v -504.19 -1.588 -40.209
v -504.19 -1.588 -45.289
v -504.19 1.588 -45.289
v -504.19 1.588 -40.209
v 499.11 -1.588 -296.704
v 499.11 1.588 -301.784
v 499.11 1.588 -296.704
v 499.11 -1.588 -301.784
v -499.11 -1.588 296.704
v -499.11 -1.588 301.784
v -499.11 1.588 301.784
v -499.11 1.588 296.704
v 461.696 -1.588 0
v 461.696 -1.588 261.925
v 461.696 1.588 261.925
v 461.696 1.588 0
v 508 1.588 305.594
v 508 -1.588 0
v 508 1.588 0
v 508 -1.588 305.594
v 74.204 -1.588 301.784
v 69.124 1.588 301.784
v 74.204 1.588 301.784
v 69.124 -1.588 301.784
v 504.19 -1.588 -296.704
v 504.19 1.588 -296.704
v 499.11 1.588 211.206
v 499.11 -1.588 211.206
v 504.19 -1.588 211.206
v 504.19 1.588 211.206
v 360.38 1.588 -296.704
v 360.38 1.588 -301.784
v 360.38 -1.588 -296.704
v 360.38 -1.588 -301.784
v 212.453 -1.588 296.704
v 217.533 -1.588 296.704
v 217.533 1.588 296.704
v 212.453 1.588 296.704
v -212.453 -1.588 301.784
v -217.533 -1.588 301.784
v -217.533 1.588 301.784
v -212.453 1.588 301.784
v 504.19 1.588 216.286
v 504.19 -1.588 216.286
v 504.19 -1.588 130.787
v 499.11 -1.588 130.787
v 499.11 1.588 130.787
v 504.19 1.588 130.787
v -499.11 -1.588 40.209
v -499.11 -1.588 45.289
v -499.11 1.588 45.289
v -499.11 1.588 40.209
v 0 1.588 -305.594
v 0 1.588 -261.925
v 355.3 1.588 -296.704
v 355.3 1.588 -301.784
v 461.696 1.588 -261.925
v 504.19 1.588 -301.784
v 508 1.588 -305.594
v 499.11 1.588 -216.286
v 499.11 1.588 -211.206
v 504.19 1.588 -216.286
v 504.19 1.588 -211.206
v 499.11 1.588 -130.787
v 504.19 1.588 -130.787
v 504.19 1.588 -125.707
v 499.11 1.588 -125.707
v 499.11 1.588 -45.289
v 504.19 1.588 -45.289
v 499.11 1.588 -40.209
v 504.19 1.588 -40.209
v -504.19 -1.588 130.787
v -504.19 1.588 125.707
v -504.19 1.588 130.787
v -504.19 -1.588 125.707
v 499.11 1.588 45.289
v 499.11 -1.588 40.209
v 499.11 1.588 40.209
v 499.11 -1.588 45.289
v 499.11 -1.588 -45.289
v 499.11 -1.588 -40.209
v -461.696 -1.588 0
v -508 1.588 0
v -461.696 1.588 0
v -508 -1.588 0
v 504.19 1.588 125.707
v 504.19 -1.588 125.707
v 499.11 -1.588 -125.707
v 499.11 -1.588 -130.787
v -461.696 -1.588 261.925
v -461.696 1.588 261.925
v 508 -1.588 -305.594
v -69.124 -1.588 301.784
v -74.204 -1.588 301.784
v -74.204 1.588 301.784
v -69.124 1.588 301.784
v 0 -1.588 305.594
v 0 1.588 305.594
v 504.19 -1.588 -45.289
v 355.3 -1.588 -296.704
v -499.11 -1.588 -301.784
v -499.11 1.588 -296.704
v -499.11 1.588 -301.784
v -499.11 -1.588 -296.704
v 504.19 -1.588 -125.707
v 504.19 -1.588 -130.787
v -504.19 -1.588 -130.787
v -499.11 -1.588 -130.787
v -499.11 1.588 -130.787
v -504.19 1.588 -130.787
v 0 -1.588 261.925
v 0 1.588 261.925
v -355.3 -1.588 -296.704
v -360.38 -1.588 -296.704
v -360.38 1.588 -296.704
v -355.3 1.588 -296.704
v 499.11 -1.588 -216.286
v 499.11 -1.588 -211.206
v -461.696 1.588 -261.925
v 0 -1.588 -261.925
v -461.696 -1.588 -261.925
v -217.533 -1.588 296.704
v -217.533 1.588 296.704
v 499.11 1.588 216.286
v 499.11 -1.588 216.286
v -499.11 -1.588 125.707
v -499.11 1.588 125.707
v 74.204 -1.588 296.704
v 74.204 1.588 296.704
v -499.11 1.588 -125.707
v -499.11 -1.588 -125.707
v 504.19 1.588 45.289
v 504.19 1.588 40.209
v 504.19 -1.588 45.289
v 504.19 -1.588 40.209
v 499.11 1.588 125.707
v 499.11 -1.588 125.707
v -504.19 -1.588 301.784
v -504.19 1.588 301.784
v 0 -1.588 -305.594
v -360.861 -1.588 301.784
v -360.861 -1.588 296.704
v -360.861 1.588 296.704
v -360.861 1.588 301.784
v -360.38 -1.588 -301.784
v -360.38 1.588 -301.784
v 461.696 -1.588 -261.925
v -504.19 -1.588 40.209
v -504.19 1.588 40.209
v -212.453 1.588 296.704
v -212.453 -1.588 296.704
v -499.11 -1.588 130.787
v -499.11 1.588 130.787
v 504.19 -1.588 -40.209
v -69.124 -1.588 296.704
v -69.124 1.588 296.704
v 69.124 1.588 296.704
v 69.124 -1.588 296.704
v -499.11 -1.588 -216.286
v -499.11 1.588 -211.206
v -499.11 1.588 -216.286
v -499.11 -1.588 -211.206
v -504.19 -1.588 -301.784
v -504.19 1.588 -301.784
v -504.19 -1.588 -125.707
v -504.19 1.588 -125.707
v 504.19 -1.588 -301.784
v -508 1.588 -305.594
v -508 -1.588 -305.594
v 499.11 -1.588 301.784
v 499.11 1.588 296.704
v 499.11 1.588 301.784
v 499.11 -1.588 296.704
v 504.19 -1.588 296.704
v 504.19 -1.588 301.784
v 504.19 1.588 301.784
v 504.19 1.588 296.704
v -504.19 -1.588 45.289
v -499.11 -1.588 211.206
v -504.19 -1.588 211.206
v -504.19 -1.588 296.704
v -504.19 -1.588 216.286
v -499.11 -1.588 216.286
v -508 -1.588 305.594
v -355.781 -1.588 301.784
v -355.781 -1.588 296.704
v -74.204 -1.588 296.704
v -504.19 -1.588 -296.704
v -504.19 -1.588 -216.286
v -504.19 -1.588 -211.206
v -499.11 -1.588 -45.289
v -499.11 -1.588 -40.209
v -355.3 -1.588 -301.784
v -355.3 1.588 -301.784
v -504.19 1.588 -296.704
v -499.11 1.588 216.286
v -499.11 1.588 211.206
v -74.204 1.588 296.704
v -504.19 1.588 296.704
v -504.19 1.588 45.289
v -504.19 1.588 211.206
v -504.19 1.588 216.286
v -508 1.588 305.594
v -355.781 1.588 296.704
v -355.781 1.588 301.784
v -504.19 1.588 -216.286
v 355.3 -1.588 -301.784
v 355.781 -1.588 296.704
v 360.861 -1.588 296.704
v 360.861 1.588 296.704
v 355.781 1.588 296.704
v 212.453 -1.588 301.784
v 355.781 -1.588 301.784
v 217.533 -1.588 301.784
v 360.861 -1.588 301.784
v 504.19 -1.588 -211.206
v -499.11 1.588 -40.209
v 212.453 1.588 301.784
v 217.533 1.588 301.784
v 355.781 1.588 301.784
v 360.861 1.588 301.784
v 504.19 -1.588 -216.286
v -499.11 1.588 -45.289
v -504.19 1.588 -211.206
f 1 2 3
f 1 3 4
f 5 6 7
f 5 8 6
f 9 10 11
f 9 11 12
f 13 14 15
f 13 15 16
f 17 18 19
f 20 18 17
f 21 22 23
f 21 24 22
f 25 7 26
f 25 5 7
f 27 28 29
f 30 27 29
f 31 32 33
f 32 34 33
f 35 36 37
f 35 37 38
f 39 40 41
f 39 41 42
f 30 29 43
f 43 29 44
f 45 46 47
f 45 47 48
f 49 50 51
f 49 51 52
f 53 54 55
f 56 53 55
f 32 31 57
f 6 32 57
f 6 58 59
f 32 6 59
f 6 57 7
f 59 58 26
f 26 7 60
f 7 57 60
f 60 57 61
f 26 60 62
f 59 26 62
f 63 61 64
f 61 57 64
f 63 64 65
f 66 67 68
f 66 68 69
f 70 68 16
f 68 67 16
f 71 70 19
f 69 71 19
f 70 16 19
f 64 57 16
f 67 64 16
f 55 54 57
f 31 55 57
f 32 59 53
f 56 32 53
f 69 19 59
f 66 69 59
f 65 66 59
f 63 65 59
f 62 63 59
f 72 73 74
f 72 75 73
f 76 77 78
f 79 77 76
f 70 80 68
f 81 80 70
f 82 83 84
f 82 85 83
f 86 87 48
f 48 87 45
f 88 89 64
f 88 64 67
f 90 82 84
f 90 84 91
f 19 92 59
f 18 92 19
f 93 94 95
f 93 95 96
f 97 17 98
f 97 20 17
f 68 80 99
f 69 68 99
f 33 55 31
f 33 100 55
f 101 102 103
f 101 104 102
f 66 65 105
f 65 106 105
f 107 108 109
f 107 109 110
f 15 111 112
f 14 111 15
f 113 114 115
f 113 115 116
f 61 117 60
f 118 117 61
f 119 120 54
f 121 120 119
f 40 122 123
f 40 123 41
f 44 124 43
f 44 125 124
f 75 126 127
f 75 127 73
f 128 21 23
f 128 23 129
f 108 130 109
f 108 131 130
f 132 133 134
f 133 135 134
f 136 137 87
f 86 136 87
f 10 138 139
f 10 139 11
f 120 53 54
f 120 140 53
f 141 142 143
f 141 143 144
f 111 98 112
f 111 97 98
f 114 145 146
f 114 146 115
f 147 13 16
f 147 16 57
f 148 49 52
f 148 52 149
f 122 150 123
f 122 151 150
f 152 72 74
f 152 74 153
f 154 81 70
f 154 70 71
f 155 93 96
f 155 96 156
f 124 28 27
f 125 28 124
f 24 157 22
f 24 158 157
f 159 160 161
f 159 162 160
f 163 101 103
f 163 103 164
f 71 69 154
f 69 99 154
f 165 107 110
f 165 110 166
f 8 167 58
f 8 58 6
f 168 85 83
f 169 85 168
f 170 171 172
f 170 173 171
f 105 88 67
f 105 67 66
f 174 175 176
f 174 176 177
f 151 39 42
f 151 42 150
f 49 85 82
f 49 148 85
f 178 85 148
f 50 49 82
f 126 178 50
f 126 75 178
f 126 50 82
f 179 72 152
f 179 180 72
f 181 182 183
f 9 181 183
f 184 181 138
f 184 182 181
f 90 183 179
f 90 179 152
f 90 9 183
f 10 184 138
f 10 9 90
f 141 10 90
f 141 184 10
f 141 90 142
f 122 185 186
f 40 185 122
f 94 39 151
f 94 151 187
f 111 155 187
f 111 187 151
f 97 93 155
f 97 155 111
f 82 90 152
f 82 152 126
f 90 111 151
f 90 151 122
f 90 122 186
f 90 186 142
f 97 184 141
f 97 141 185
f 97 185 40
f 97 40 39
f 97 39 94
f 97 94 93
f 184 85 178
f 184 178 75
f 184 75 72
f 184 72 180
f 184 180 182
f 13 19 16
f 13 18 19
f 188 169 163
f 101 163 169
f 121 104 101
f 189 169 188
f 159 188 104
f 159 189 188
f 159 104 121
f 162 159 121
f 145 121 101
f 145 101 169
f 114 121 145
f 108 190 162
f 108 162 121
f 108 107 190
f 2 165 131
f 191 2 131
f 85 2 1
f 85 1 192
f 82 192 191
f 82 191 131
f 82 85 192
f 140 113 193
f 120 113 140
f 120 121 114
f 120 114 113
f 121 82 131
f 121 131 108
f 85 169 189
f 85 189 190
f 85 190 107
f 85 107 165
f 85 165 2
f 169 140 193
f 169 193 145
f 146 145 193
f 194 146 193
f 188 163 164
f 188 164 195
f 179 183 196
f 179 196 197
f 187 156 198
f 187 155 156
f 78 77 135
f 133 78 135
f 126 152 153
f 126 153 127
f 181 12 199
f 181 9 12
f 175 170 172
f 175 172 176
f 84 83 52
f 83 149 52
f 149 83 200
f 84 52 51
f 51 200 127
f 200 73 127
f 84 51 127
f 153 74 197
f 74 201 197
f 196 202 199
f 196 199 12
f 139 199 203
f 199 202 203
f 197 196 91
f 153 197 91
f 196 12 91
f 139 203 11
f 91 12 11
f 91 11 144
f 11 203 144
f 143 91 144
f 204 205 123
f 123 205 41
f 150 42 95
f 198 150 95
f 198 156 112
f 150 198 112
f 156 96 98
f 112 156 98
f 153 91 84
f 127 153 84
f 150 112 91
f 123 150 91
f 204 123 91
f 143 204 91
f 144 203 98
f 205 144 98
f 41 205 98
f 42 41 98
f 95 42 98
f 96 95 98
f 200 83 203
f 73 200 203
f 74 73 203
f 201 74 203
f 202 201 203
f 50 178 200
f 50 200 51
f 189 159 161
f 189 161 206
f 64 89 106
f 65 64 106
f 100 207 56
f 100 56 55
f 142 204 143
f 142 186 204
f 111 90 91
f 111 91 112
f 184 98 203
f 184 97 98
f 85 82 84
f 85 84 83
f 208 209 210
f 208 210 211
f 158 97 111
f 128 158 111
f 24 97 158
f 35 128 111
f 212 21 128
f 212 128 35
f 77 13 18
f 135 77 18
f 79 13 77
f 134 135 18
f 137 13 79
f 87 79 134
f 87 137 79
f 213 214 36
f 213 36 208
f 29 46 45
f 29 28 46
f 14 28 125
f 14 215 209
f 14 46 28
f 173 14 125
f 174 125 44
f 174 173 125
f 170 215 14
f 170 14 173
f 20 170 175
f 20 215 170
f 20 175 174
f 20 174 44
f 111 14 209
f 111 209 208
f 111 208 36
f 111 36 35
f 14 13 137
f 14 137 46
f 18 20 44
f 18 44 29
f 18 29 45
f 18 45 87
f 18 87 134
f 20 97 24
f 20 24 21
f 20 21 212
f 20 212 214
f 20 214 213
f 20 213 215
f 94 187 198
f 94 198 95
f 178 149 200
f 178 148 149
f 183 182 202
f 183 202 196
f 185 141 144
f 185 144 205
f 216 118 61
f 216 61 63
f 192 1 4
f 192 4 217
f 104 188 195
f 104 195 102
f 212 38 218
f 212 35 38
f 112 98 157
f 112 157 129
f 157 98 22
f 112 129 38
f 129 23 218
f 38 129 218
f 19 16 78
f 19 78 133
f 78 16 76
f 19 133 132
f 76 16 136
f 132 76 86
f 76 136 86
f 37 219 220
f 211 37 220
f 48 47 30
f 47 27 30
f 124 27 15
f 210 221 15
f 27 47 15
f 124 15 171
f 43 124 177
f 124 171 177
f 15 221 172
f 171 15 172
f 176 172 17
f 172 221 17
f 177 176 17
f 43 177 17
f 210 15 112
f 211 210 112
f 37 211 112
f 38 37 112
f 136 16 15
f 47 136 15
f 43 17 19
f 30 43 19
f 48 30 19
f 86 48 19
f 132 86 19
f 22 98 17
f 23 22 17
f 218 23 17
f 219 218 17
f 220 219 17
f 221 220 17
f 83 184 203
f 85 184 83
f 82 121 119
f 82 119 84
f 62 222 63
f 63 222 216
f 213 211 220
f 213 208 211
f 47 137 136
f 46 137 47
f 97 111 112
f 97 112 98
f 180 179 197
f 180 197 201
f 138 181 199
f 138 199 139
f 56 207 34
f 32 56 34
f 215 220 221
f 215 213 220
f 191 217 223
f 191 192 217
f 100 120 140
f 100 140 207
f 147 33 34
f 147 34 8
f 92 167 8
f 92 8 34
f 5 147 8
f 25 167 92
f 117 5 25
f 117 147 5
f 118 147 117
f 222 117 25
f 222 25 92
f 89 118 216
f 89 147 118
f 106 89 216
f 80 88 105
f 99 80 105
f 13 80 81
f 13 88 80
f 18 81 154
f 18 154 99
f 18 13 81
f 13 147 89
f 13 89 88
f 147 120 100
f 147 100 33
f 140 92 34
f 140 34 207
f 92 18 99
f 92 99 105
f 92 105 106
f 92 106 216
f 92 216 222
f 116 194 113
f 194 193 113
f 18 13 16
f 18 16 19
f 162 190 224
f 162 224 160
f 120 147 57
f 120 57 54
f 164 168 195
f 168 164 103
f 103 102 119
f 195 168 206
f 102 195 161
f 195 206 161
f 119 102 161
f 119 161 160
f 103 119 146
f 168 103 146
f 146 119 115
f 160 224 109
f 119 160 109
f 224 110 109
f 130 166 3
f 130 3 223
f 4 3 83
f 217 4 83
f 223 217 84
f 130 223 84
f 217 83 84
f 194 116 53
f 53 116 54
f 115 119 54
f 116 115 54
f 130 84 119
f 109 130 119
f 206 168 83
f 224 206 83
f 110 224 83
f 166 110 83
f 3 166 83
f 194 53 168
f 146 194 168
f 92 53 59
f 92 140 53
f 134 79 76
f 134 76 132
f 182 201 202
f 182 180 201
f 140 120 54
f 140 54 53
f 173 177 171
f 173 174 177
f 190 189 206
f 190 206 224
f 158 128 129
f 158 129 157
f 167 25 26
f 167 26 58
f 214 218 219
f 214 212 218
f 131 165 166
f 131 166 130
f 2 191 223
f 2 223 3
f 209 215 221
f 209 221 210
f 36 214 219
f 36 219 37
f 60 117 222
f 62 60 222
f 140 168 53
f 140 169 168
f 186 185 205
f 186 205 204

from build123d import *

# Parameters (mm, degrees)
F1_DEPTH = 1.5875
F0_W     = 5.08
F0_H     = 5.08
F2_DEPTH = 1.5875
F3_DEPTH = 1.5875
F4_DEPTH = 1.5875


with BuildPart() as f1:
    # F0 (on Front) → F1 (new body, symmetric)
    with BuildSketch(Plane.XZ):
        Polygon((-508, 0), (-501.65, 0), (-501.65, 40.209107), (-504.19, 40.209107), (-504.19, 45.289107), (-501.65, 45.289107), (-501.65, 125.707321), (-504.19, 125.707321), (-504.19, 130.787321), (-501.65, 130.787321), (-501.65, 211.205536), (-504.19, 211.205536), (-504.19, 216.285536), (-501.65, 216.285536), (-501.65, 296.70375), (-504.19, 296.70375), (-504.19, 301.78375), (-508, 305.59375), align=None)
        Polygon((-495.3, 0), (-495.3, 292.89375), (-499.11, 296.70375), (-501.65, 296.70375), (-501.65, 216.285536), (-499.11, 216.285536), (-499.11, 211.205536), (-501.65, 211.205536), (-501.65, 130.787321), (-499.11, 130.787321), (-499.11, 125.707321), (-501.65, 125.707321), (-501.65, 45.289107), (-499.11, 45.289107), (-499.11, 40.209107), (-501.65, 40.209107), (-501.65, 0), align=None)
        Polygon((0, 261.925), (0, 276.225), (-475.996, 276.225), (-475.996, 0), (-461.696, 0), (-461.696, 261.925), align=None)
        Polygon((-495.3, 292.89375), (0, 292.89375), (0, 299.24375), (-69.124286, 299.24375), (-69.124286, 296.70375), (-74.204286, 296.70375), (-74.204286, 299.24375), (-212.452857, 299.24375), (-212.452857, 296.70375), (-217.532857, 296.70375), (-217.532857, 299.24375), (-355.781429, 299.24375), (-355.781429, 296.70375), (-360.861429, 296.70375), (-360.861429, 299.24375), (-499.11, 299.24375), (-499.11, 296.70375), align=None)
        Polygon((-69.124286, 299.24375), (0, 299.24375), (0, 305.59375), (-508, 305.59375), (-504.19, 301.78375), (-499.11, 301.78375), (-499.11, 299.24375), (-360.861429, 299.24375), (-360.861429, 301.78375), (-355.781429, 301.78375), (-355.781429, 299.24375), (-217.532857, 299.24375), (-217.532857, 301.78375), (-212.452857, 301.78375), (-212.452857, 299.24375), (-74.204286, 299.24375), (-74.204286, 301.78375), (-69.124286, 301.78375), align=None)
        Polygon((0, 276.225), (0, 292.89375), (-495.3, 292.89375), (-495.3, 0), (-475.996, 0), (-475.996, 276.225), align=None)
    extrude(amount=F1_DEPTH, both=True)


with BuildPart() as f2:
    # F0 (on Front) → F2 (new body, symmetric)
    with BuildSketch(Plane.XZ):
        Polygon((0, 305.59375), (0, 299.24375), (69.124286, 299.24375), (69.124286, 301.78375), (74.204286, 301.78375), (74.204286, 299.24375), (212.452857, 299.24375), (212.452857, 301.78375), (217.532857, 301.78375), (217.532857, 299.24375), (355.781429, 299.24375), (355.781429, 301.78375), (360.861429, 301.78375), (360.861429, 299.24375), (499.11, 299.24375), (499.11, 301.78375), (504.19, 301.78375), (508, 305.59375), align=None)
        Polygon((0, 292.89375), (495.3, 292.89375), (499.11, 296.70375), (499.11, 299.24375), (360.861429, 299.24375), (360.861429, 296.70375), (355.781429, 296.70375), (355.781429, 299.24375), (217.532857, 299.24375), (217.532857, 296.70375), (212.452857, 296.70375), (212.452857, 299.24375), (74.204286, 299.24375), (74.204286, 296.70375), (69.124286, 296.70375), (69.124286, 299.24375), (0, 299.24375), align=None)
        Polygon((495.3, 0), (495.3, 292.89375), (0, 292.89375), (0, 276.225), (475.996, 276.225), (475.996, 0), align=None)
        Polygon((475.996, 276.225), (0, 276.225), (0, 261.925), (461.696, 261.925), (461.696, 0), (475.996, 0), align=None)
        Polygon((499.11, 296.70375), (495.3, 292.89375), (495.3, 0), (508, 0), (508, 305.59375), (504.19, 301.78375), (504.19, 296.70375), align=None)
        with Locations((501.65, 42.749107)):
            Rectangle(F0_W, F0_H, mode=Mode.SUBTRACT)
        with Locations((501.65, 128.247321)):
            Rectangle(F0_W, F0_H, mode=Mode.SUBTRACT)
        with Locations((501.65, 213.745536)):
            Rectangle(F0_W, F0_H, mode=Mode.SUBTRACT)
    extrude(amount=F2_DEPTH, both=True)


with BuildPart() as f3:
    # F0 (on Front) → F3 (new body, symmetric)
    with BuildSketch(Plane.XZ):
        Polygon((508, 0), (495.3, 0), (495.3, -292.89375), (499.11, -296.70375), (504.19, -296.70375), (504.19, -301.78375), (508, -305.59375), align=None)
        with Locations((501.65, -213.745536)):
            Rectangle(F0_W, F0_H, mode=Mode.SUBTRACT)
        with Locations((501.65, -128.247321)):
            Rectangle(F0_W, F0_H, mode=Mode.SUBTRACT)
        with Locations((501.65, -42.749107)):
            Rectangle(F0_W, F0_H, mode=Mode.SUBTRACT)
        Polygon((495.3, -292.89375), (495.3, 0), (475.996, 0), (475.996, -276.225), (0, -276.225), (0, -292.89375), align=None)
        Polygon((475.996, -276.225), (475.996, 0), (461.696, 0), (461.696, -261.925), (0, -261.925), (0, -276.225), align=None)
        Polygon((499.11, -296.70375), (495.3, -292.89375), (0, -292.89375), (0, -305.59375), (508, -305.59375), (504.19, -301.78375), (499.11, -301.78375), align=None)
        with Locations((357.84, -299.24375)):
            Rectangle(F0_W, F0_H, mode=Mode.SUBTRACT)
    extrude(amount=F3_DEPTH, both=True)


with BuildPart() as f4:
    # F0 (on Front) → F4 (new body, symmetric)
    with BuildSketch(Plane.XZ):
        Polygon((0, -305.59375), (0, -292.89375), (-495.3, -292.89375), (-499.11, -296.70375), (-499.11, -301.78375), (-504.19, -301.78375), (-508, -305.59375), align=None)
        with Locations((-357.84, -299.24375)):
            Rectangle(F0_W, F0_H, mode=Mode.SUBTRACT)
        Polygon((-475.996, 0), (-495.3, 0), (-495.3, -292.89375), (0, -292.89375), (0, -276.225), (-475.996, -276.225), align=None)
        Polygon((-461.696, 0), (-475.996, 0), (-475.996, -276.225), (0, -276.225), (0, -261.925), (-461.696, -261.925), align=None)
        Polygon((-495.3, -292.89375), (-495.3, 0), (-501.65, 0), (-501.65, -40.209107), (-499.11, -40.209107), (-499.11, -45.289107), (-501.65, -45.289107), (-501.65, -125.707321), (-499.11, -125.707321), (-499.11, -130.787321), (-501.65, -130.787321), (-501.65, -211.205536), (-499.11, -211.205536), (-499.11, -216.285536), (-501.65, -216.285536), (-501.65, -296.70375), (-499.11, -296.70375), align=None)
        Polygon((-501.65, -40.209107), (-501.65, 0), (-508, 0), (-508, -305.59375), (-504.19, -301.78375), (-504.19, -296.70375), (-501.65, -296.70375), (-501.65, -216.285536), (-504.19, -216.285536), (-504.19, -211.205536), (-501.65, -211.205536), (-501.65, -130.787321), (-504.19, -130.787321), (-504.19, -125.707321), (-501.65, -125.707321), (-501.65, -45.289107), (-504.19, -45.289107), (-504.19, -40.209107), align=None)
    extrude(amount=F4_DEPTH, both=True)


solid = Compound([f1.part, f2.part, f3.part, f4.part])
